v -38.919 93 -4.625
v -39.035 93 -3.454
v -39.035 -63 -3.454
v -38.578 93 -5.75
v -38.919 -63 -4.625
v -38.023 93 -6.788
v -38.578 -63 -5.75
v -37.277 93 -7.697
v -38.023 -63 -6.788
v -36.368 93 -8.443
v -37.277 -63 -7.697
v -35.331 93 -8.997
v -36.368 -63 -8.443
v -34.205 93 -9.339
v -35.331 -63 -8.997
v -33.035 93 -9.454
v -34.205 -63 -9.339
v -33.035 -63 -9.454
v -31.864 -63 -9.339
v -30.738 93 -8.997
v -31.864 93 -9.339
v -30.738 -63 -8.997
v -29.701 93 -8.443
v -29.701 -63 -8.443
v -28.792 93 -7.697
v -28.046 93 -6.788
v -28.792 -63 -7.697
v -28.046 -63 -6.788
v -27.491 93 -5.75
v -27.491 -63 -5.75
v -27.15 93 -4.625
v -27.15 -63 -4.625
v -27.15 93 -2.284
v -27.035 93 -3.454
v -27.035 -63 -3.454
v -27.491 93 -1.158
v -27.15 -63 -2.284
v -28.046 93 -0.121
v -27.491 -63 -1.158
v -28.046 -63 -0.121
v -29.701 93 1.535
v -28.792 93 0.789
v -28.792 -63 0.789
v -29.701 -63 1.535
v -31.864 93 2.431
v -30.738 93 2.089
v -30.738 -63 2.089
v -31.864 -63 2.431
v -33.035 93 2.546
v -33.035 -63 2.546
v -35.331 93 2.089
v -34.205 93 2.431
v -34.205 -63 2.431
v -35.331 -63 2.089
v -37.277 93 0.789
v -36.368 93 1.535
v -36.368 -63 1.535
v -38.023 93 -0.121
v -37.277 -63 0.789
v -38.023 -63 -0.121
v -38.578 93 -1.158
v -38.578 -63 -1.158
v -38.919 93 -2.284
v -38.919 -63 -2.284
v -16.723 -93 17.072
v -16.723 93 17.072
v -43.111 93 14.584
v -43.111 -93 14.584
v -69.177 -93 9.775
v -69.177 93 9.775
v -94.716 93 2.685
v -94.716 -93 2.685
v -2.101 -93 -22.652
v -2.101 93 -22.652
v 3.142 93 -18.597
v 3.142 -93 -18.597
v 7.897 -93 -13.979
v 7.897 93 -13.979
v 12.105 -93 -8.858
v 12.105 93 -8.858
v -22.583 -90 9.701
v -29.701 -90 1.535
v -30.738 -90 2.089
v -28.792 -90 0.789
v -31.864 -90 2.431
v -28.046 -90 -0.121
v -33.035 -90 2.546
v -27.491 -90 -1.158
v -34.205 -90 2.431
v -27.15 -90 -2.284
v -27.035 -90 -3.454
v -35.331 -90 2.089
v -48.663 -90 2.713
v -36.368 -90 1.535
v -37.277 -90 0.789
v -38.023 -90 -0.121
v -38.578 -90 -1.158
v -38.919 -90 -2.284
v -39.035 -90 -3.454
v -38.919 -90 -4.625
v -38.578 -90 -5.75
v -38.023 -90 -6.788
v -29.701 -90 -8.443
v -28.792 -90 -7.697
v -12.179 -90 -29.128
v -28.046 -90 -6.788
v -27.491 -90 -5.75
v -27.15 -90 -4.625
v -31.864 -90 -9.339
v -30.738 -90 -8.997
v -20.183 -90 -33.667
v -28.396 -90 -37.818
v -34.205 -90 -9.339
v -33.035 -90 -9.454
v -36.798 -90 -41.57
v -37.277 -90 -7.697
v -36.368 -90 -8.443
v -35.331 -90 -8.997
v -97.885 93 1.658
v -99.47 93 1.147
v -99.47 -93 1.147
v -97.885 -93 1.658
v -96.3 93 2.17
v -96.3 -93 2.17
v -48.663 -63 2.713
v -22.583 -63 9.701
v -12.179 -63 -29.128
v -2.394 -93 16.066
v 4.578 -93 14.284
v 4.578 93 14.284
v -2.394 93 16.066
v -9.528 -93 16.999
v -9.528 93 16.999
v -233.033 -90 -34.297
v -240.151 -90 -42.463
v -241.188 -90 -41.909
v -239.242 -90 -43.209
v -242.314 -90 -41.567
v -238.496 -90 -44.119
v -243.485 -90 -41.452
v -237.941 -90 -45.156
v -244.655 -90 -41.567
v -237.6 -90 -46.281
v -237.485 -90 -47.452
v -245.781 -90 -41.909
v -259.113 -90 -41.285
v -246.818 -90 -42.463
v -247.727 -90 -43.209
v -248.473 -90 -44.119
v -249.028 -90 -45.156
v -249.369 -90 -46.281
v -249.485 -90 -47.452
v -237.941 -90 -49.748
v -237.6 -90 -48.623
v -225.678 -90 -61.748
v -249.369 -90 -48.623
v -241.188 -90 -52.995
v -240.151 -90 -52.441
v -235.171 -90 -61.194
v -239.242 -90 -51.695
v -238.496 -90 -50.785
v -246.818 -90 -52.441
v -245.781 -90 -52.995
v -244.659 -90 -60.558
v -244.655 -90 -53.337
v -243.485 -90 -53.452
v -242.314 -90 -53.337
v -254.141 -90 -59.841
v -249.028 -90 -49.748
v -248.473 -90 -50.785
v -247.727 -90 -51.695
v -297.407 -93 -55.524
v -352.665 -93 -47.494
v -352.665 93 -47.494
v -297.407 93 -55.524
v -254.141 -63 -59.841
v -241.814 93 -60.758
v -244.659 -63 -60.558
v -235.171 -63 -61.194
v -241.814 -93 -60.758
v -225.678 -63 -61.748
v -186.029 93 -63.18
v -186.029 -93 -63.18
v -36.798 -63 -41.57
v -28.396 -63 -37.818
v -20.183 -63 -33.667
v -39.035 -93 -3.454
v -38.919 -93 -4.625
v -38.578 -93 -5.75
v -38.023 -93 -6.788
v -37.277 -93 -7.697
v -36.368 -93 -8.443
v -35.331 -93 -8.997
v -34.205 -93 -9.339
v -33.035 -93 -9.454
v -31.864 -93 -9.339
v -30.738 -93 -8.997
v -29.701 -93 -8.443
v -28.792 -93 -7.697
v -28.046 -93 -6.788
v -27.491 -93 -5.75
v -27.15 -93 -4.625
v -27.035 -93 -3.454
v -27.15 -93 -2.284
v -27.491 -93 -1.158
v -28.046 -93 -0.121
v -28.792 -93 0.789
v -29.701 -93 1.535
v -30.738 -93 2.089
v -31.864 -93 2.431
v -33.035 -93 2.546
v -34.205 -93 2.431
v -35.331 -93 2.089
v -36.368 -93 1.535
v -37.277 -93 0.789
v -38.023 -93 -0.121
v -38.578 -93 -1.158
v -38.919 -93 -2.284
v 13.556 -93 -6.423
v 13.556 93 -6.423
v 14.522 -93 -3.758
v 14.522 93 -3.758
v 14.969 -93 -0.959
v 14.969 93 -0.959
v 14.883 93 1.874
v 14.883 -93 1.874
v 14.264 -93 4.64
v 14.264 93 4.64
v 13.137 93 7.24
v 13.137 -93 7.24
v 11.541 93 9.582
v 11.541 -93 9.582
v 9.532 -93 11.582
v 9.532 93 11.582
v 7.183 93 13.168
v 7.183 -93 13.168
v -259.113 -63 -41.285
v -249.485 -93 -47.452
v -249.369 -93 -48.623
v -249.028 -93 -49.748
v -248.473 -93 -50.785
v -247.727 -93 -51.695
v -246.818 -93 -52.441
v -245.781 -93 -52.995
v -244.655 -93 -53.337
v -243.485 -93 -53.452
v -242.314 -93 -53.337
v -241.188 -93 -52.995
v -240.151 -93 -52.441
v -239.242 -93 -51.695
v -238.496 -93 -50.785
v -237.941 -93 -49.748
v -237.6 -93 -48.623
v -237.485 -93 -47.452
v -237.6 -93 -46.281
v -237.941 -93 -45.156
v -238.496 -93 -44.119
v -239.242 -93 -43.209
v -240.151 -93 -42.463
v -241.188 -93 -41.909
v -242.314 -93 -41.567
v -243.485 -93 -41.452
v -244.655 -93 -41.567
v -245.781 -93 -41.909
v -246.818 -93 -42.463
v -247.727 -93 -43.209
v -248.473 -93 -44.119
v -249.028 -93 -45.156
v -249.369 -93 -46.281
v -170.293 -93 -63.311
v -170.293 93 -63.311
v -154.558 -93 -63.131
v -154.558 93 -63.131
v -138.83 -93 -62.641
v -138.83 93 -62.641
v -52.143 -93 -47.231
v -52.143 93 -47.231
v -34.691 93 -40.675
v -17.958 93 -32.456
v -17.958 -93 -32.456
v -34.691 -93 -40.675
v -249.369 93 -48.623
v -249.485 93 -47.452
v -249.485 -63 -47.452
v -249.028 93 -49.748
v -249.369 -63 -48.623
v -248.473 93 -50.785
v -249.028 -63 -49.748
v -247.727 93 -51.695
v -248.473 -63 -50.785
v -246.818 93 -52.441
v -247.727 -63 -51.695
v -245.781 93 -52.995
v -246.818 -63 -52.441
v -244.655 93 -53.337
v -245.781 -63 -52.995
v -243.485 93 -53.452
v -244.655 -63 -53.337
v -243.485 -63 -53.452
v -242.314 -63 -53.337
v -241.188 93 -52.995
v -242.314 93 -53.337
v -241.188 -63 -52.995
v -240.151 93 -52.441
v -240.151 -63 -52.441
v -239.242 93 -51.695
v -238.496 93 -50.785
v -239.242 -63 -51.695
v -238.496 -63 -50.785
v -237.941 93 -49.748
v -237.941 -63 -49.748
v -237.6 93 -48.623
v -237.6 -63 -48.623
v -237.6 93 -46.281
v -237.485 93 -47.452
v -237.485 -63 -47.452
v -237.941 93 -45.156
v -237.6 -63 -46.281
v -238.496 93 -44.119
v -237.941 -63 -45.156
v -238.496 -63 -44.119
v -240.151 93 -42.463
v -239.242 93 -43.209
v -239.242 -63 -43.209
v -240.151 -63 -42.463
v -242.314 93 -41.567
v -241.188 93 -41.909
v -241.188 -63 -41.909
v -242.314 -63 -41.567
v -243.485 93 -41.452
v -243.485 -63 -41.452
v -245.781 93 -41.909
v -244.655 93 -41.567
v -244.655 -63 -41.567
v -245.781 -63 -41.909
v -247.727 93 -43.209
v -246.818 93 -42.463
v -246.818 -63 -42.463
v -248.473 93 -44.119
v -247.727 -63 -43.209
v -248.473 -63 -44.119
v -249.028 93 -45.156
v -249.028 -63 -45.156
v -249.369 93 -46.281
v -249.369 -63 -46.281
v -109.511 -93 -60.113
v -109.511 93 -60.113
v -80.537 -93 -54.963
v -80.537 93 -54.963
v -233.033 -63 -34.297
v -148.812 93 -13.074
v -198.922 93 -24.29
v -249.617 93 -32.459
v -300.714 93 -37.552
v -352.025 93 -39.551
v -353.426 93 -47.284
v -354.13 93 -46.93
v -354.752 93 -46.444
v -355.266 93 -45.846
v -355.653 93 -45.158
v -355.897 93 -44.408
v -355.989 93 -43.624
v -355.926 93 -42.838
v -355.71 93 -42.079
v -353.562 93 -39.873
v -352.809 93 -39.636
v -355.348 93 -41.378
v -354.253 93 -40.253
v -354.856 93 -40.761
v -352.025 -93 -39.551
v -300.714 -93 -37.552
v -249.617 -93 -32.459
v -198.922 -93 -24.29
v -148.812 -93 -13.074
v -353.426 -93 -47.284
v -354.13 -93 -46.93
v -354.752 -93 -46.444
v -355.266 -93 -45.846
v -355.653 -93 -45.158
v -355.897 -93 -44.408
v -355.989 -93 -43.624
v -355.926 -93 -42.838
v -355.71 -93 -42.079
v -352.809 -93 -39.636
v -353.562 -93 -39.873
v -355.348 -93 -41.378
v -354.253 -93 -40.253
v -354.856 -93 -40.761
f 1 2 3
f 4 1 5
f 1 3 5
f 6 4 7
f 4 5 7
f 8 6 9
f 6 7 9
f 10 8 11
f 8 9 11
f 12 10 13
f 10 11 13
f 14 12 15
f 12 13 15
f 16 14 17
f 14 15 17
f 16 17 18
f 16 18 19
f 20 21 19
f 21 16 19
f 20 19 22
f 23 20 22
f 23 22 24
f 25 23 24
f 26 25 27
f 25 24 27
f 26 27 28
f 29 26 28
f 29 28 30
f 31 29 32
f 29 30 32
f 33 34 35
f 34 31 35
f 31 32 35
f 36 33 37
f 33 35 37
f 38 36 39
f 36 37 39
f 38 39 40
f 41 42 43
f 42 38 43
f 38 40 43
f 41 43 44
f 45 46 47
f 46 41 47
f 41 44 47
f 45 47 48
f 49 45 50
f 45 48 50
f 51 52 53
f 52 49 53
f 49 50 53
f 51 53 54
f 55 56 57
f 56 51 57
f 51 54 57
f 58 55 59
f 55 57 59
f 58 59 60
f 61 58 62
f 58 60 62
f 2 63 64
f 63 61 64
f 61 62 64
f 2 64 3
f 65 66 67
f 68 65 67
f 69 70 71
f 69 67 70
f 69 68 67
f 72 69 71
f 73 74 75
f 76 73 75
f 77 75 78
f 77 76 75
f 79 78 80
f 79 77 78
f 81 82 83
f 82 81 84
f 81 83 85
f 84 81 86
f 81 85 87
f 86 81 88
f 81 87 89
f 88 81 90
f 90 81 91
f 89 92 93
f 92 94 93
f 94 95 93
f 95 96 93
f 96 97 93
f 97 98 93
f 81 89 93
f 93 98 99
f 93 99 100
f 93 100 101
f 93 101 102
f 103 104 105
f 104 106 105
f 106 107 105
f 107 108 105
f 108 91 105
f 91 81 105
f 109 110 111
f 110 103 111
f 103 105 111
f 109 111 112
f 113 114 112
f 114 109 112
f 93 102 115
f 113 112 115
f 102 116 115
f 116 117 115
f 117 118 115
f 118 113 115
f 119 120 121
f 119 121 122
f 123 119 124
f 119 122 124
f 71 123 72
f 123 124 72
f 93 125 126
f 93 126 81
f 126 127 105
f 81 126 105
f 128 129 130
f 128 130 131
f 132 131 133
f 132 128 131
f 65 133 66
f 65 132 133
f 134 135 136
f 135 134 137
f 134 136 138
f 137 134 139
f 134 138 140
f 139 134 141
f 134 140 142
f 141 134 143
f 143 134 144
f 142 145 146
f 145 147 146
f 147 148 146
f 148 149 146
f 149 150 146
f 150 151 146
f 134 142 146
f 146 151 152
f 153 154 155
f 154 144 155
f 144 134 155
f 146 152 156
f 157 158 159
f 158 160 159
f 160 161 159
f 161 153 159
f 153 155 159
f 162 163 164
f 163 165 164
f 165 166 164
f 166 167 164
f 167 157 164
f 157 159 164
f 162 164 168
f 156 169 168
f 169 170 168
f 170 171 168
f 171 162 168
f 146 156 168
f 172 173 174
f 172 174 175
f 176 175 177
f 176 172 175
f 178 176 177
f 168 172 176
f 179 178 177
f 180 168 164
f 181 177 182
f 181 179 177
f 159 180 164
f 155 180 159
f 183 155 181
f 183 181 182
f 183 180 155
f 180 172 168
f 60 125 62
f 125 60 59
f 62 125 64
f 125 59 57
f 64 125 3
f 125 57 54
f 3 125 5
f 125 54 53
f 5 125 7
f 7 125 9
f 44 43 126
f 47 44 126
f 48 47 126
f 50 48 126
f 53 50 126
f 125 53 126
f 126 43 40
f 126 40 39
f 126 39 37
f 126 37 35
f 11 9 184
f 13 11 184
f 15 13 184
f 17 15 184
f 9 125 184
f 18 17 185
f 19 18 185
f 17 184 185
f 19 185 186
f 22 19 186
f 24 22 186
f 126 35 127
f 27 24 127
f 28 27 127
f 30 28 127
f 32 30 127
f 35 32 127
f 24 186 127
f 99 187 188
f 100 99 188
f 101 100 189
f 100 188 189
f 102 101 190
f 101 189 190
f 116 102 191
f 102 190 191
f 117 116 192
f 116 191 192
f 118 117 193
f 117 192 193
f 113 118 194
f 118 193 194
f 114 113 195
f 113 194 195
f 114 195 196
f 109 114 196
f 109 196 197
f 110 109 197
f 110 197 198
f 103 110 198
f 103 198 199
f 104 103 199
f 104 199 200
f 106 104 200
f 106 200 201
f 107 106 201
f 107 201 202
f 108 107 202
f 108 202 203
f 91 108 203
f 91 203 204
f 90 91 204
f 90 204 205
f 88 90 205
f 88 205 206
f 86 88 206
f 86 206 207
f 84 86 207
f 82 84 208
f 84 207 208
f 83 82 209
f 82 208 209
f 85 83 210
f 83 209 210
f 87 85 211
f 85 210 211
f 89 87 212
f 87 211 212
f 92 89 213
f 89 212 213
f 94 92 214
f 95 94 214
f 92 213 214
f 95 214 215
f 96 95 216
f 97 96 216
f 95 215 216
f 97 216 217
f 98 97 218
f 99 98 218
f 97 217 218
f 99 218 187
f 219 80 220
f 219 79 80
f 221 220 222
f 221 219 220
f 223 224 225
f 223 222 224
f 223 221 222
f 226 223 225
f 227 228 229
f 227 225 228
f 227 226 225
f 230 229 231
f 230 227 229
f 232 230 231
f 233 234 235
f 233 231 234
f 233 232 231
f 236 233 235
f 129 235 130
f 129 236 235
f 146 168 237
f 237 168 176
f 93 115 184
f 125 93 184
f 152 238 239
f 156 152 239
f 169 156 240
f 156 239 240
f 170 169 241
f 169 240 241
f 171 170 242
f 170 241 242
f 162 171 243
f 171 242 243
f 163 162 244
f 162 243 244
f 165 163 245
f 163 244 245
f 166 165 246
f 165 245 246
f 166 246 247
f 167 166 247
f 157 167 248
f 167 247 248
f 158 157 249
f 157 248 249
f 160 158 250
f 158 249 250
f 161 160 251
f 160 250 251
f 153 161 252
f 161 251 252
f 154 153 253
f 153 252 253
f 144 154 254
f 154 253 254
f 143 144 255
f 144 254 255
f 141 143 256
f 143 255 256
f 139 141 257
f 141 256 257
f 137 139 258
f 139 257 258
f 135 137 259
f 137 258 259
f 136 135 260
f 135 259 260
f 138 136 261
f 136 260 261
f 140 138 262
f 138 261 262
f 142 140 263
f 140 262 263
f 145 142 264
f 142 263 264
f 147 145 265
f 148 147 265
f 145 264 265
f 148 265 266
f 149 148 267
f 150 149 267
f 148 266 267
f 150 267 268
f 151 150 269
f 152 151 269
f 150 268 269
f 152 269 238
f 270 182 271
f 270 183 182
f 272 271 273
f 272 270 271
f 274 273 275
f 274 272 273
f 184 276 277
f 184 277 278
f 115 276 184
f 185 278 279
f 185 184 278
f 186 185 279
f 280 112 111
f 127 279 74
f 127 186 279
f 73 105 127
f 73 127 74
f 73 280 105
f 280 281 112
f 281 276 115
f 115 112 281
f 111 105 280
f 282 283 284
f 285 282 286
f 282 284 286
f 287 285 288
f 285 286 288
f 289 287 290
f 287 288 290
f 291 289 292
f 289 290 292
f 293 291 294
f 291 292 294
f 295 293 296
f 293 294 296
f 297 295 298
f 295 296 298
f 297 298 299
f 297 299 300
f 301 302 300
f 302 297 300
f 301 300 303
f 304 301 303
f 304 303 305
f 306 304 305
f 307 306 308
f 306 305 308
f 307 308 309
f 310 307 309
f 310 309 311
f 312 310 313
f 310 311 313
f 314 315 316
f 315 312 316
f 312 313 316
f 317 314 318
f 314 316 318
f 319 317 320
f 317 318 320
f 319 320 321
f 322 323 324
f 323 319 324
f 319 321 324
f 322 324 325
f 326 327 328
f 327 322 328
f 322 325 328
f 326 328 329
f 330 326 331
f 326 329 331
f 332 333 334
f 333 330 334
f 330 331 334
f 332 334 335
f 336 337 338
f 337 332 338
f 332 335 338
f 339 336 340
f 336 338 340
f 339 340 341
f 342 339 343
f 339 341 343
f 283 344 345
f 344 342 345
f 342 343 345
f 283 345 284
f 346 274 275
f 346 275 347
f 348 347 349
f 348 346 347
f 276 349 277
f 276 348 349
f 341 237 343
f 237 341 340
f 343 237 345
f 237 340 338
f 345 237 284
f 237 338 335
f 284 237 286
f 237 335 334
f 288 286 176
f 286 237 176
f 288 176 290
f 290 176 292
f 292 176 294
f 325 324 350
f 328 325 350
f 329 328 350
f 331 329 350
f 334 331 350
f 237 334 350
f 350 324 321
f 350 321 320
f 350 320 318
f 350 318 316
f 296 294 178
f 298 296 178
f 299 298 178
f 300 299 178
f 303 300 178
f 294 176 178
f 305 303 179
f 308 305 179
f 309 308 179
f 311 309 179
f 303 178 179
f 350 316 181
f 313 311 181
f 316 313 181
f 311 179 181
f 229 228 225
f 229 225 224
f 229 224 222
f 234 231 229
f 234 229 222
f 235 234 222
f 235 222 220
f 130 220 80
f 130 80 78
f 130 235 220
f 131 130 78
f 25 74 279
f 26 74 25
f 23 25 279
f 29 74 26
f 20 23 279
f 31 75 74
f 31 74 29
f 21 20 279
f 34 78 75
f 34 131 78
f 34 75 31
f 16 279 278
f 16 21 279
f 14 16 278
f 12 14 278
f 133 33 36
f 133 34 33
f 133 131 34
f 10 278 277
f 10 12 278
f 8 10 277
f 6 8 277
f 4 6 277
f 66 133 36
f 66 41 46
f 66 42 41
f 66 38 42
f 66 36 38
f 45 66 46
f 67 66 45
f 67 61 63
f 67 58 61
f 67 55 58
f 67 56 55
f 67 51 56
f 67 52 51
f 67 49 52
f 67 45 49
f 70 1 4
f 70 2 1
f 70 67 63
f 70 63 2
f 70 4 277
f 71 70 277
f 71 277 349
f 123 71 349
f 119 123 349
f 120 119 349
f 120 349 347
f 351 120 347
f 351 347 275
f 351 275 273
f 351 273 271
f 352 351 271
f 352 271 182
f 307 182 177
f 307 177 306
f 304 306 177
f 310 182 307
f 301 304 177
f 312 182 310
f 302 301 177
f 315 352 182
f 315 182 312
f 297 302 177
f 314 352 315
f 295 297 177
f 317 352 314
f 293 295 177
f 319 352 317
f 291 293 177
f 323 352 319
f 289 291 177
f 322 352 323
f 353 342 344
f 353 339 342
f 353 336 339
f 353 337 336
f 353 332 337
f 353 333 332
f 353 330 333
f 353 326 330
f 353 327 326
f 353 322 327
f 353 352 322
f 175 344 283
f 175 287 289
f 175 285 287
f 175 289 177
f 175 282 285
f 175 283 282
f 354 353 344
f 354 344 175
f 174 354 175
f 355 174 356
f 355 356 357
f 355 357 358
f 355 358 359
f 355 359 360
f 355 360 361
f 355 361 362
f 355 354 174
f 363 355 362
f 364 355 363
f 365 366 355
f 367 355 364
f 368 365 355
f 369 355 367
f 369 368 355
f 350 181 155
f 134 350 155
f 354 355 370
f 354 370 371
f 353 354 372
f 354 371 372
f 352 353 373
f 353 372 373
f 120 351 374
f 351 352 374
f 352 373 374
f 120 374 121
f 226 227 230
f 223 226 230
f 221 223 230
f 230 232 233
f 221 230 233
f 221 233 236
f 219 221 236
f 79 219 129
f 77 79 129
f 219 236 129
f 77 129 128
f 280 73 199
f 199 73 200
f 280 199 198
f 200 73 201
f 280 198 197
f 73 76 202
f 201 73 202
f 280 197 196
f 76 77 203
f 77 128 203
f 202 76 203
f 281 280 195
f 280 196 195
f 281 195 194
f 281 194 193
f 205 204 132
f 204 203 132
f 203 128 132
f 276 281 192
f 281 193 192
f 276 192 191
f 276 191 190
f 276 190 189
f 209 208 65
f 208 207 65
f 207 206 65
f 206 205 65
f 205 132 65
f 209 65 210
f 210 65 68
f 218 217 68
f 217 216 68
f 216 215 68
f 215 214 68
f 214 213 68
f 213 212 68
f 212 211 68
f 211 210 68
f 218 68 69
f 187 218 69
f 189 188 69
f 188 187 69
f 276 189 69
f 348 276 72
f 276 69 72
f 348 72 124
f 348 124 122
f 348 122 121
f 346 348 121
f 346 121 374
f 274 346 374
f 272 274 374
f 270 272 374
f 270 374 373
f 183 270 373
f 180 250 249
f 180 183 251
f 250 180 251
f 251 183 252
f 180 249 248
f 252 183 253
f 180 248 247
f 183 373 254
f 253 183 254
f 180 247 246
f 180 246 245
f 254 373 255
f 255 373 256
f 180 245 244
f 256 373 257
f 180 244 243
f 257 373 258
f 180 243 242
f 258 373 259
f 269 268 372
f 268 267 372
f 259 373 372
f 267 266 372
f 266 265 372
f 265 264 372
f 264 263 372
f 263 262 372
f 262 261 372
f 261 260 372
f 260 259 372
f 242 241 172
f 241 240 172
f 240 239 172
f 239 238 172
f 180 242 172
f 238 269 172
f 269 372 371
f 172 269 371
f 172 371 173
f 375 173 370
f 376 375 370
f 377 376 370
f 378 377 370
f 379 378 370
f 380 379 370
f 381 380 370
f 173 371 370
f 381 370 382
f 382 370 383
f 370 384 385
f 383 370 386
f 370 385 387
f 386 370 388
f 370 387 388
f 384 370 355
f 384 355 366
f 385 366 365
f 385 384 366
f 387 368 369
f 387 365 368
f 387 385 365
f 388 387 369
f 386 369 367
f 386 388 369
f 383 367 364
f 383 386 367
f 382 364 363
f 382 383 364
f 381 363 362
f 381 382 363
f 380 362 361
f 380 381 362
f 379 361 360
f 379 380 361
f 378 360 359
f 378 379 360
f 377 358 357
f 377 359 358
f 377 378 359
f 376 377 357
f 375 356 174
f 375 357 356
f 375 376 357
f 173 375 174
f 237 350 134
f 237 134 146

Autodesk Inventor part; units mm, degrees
ref_plane "YZ Plane" through (0, 0, 0) normal (1, 0, 0) x (0, 1, 0)
ref_plane "XZ Plane" through (0, 0, 0) normal (0, 1, 0) x (-1, 0, 0)
ref_plane "XY Plane" through (0, 0, 0) normal (0, 0, 1) x (1, 0, 0)
sketch "スケッチ2" plane through (0, 0, 0) normal (0, 1, 0) x (-1, 0, 0)
  arc A0 (186.0286, -63.1802) -> (352.6649, -47.4935) centre (165.9229, 1043.3137) ccw projected
  arc A1 (138.8299, -62.6406) -> (186.0286, -63.1802) centre (171.5405, 734.1521) ccw projected
  arc A2 (52.1426, -47.2314) -> (138.8299, -62.6406) centre (152.2575, 264.4411) ccw projected
  arc A3 (2.1008, -22.6524) -> (52.1426, -47.2314) centre (110.8425, 135.5101) ccw projected
  arc A4 (-12.1054, -8.8578) -> (2.1008, -22.6524) centre (35.5695, 26.0271) ccw projected
  arc A5 (-4.5779, 14.2844) -> (-12.1054, -8.8578) centre (0, 0) ccw projected
  arc A6 (16.7232, 17.0724) -> (-4.5779, 14.2844) centre (13.7336, -42.8531) ccw projected
  arc A7 (94.7165, 2.6851) -> (16.7232, 17.0724) centre (1.7751, -282.555) ccw projected
  arc A8 (94.7165, 2.6851) -> (99.4705, 1.147) centre (466.4821, 1143.6454) ccw projected
  arc A9 (99.4705, 1.147) -> (352.0248, -39.551) centre (359.437, 810.4167) ccw projected
  arc A10 (352.6649, -47.4935) -> (352.0248, -39.551) centre (351.99, -43.5508) ccw projected
  circle A11 centre (33.0346, -3.4541) radius 6 projected
  circle A12 centre (243.4846, -47.452) radius 6 projected
  point P0 (0, 0)
extrude "押し出し2" add sketch "スケッチ2" along normal mid plane 186
ref_plane "作業平面1" through (-10.8988, -64, -64.8158) normal (0.2588, 0, -0.9659) x (0, -1, 0)
ref_plane "作業平面2" through (-226.5252, -64, -89.4952) normal (-0.2588, 0, 0.9659) x (-0.9659, 0, -0.2588)
sketch "スケッチ3" plane through (-10.8988, -64, -64.8158) normal (0.2588, 0, -0.9659) x (0, -1, 0)
  line L0 (25, -7) -> (0, -7) projected
  line L1 (0, -7) -> (0, 18) projected
  line L2 (0, 18) -> (25, 18) projected
  line L3 (25, 18) -> (25, -7) projected
  line L4 (-1, -8) -> (26, -8)
  line L5 (26, -8) -> (26, 19)
  line L6 (26, 19) -> (-1, 19)
  line L7 (-1, 19) -> (-1, -8)
  point P0 (-64, -27.303)
  dimension "d6" = 1
extrude "押し出し3" cut sketch "スケッチ3" against normal blind 75 contours L0 L1 L2 L3 | L7 L6 L5 L4
sketch "スケッチ4" plane through (-226.5252, -64, -89.4952) normal (-0.2588, 0, 0.9659) x (-0.9659, 0, -0.2588)
  line L0 (-7, 25) -> (-7, 0) projected
  line L1 (-7, 0) -> (18, 0) projected
  line L2 (18, 0) -> (18, 25) projected
  line L3 (18, 25) -> (-7, 25) projected
  line L4 (-8, -1) -> (-8, 26)
  line L5 (-8, 26) -> (19, 26)
  line L6 (19, 26) -> (19, -1)
  line L7 (19, -1) -> (-8, -1)
  point P0 (-241.9696, -64)
  dimension "d9" = 1
extrude "押し出し4" cut sketch "スケッチ4" along normal blind 55 contours L3 L2 L1 L0 | L4 L5 L6 L7
properties part number "mainflap for side"
